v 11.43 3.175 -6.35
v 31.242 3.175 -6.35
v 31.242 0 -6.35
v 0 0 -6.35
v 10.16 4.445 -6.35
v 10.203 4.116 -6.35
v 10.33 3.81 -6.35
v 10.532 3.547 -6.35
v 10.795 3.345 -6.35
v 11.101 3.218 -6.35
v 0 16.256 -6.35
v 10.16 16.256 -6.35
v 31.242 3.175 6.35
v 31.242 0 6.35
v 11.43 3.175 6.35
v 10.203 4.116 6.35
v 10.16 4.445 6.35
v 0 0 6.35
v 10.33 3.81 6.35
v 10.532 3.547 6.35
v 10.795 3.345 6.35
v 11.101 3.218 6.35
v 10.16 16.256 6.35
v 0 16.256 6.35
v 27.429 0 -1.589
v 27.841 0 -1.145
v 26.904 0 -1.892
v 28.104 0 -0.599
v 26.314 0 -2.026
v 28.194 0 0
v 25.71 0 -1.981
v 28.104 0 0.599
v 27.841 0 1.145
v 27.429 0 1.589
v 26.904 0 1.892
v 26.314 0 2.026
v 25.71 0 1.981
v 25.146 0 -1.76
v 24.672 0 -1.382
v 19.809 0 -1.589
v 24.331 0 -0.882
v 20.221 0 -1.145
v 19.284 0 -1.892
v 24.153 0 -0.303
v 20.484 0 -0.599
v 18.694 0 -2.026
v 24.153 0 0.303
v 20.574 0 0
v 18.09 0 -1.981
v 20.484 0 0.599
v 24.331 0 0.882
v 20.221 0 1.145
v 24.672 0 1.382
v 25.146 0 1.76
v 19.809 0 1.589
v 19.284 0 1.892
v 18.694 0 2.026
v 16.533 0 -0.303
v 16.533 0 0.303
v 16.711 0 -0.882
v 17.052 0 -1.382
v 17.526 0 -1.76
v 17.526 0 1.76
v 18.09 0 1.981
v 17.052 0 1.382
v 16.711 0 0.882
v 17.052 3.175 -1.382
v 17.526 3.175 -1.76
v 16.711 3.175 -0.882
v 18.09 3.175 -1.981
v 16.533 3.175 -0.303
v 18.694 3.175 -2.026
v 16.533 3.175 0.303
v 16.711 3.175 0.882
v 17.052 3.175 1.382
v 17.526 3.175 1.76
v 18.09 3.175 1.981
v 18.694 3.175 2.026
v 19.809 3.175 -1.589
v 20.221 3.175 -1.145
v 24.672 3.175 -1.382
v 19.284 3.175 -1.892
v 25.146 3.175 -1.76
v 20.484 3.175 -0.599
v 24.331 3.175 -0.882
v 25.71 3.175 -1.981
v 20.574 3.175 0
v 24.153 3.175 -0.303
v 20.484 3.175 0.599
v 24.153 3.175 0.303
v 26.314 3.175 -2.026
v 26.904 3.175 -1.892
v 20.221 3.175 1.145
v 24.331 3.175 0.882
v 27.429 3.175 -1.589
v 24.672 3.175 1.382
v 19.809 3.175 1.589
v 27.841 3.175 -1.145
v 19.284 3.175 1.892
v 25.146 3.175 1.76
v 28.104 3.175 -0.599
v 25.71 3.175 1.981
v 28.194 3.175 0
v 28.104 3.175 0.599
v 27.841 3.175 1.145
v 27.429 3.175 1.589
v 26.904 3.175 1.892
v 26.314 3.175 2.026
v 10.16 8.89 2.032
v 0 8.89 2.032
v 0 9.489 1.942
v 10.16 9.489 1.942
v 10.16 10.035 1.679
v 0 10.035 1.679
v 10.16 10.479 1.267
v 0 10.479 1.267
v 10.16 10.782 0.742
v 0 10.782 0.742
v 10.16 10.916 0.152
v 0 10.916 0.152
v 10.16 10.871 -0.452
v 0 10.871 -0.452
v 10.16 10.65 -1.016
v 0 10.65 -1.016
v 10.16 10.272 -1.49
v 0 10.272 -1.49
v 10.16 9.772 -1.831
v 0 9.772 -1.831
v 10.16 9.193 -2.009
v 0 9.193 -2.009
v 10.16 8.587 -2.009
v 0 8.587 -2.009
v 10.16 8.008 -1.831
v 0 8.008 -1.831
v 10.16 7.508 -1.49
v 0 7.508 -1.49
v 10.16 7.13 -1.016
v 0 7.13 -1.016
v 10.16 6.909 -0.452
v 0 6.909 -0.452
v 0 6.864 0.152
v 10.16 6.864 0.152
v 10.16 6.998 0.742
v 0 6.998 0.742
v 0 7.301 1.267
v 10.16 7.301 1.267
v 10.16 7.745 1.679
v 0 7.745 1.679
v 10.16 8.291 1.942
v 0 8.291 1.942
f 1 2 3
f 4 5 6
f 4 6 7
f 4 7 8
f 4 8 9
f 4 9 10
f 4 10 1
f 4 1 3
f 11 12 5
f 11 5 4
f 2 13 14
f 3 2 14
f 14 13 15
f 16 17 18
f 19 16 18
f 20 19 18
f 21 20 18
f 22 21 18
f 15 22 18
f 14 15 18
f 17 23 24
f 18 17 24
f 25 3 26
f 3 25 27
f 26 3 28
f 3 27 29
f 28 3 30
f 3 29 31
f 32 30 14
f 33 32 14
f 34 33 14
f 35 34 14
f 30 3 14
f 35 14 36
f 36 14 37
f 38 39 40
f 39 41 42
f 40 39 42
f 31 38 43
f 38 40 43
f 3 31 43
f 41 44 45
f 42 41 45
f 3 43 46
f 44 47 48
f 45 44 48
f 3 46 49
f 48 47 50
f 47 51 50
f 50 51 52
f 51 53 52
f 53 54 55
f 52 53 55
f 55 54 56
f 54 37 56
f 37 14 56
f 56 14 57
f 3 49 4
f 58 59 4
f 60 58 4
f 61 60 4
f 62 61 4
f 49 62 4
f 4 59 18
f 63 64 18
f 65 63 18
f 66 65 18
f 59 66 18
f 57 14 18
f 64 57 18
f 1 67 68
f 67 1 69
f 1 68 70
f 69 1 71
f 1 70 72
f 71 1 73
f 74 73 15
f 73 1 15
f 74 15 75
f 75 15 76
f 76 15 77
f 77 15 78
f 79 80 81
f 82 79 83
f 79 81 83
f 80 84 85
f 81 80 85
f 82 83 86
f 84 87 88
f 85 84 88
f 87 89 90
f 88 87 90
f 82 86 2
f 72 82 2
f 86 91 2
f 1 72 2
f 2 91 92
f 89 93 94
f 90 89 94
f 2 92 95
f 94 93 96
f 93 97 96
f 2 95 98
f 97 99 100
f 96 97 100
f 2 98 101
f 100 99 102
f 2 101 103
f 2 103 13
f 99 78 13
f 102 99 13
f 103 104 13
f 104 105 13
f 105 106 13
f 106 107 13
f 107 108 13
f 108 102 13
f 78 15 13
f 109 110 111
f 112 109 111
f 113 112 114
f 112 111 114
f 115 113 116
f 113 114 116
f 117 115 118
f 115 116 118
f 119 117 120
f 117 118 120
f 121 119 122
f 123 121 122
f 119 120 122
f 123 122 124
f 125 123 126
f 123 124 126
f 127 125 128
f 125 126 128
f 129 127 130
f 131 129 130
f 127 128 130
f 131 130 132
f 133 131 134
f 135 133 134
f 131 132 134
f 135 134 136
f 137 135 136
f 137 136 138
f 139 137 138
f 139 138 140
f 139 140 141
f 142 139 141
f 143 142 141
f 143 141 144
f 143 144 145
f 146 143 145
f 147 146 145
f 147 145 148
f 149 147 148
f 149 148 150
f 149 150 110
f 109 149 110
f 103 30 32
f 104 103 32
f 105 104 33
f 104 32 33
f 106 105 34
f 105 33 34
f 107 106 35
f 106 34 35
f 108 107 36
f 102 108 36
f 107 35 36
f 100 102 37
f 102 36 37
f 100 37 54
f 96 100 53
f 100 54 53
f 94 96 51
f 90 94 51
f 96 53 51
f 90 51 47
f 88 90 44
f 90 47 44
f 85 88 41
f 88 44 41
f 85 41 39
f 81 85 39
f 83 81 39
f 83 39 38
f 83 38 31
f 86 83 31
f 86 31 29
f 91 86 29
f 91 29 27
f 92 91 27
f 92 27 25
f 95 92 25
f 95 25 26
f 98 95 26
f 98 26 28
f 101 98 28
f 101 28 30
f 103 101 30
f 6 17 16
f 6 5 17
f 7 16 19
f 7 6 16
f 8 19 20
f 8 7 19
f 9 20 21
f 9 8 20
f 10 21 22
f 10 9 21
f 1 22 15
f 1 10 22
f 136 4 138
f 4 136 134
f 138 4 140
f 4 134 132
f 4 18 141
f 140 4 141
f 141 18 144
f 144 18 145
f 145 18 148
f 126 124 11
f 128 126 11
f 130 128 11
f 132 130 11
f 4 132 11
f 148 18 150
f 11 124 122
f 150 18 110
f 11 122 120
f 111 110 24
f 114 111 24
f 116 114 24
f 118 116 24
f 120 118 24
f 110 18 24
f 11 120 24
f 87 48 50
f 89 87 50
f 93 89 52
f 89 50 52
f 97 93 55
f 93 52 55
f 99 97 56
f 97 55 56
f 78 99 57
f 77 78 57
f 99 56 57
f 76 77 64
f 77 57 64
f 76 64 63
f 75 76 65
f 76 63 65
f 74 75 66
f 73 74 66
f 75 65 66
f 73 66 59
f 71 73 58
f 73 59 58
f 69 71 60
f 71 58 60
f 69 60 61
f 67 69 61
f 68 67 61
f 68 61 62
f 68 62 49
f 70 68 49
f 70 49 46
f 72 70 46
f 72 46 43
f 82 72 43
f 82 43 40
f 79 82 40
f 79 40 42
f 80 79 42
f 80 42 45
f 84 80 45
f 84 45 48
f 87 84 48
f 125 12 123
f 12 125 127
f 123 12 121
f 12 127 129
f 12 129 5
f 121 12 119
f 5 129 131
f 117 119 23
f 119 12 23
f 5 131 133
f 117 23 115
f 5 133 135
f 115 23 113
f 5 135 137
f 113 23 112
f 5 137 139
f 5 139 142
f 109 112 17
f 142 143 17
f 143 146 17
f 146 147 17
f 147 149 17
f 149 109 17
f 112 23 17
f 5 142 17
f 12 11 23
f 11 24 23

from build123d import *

# Parameters (mm, degrees)
BOSS_EXTRUDE1_DEPTH = 6.35
CUT_EXTRUDE1_REACH  = 37.786
SKETCH2_R           = 2.032
CUT_EXTRUDE2_REACH  = 37.786
SKETCH3_R           = 2.032
FILLET2_R           = 1.27
LPATTERN1_COUNT     = 2
LPATTERN1_PITCH     = 7.62


with BuildPart() as part:
    # Sketch1 → Boss-Extrude1 (new, symmetric)
    with BuildSketch(Plane.XY):
        Polygon((0, 0), (0, 16.256), (10.16, 16.256), (10.16, 3.175), (31.242, 3.175), (31.242, 0), align=None)
    extrude(amount=BOSS_EXTRUDE1_DEPTH, both=True)

    # Sketch2 → Cut-Extrude1 (cut, up to next)
    with BuildSketch(Plane.ZY, mode=Mode.PRIVATE) as cut_extrude1_sk1:
        with Locations((0, 8.89)):
            Circle(SKETCH2_R)
    cut_extrude1_tool1 = extrude(cut_extrude1_sk1.sketch, amount=-CUT_EXTRUDE1_REACH, mode=Mode.PRIVATE) & part.part
    add(cut_extrude1_tool1.solids().sort_by_distance((0, 8.89, 0))[0], mode=Mode.SUBTRACT)

    # Sketch3 → Cut-Extrude2 (cut, up to next)
    with BuildSketch(Plane.XZ, mode=Mode.PRIVATE) as cut_extrude2_sk1:
        with Locations((18.542, 0)):
            Circle(SKETCH3_R)
    cut_extrude2_tool1 = extrude(cut_extrude2_sk1.sketch, amount=-CUT_EXTRUDE2_REACH, mode=Mode.PRIVATE) & part.part
    cut_extrude2 = cut_extrude2_tool1.solids().sort_by_distance((18.542, 0, 0))[0]
    add(cut_extrude2, mode=Mode.SUBTRACT)

    # Fillet2
    fillet2_edges = [part.edges().sort_by_distance(p)[0] for p in [
        (10.16, 3.175, 0),
    ]]
    fillet(fillet2_edges, radius=FILLET2_R)

    # LPattern1: Cut-Extrude2 ×2
    with Locations(*[(i * LPATTERN1_PITCH, 0, 0) for i in range(1, LPATTERN1_COUNT)]):
        add(cut_extrude2, mode=Mode.SUBTRACT)


solid = part.part
